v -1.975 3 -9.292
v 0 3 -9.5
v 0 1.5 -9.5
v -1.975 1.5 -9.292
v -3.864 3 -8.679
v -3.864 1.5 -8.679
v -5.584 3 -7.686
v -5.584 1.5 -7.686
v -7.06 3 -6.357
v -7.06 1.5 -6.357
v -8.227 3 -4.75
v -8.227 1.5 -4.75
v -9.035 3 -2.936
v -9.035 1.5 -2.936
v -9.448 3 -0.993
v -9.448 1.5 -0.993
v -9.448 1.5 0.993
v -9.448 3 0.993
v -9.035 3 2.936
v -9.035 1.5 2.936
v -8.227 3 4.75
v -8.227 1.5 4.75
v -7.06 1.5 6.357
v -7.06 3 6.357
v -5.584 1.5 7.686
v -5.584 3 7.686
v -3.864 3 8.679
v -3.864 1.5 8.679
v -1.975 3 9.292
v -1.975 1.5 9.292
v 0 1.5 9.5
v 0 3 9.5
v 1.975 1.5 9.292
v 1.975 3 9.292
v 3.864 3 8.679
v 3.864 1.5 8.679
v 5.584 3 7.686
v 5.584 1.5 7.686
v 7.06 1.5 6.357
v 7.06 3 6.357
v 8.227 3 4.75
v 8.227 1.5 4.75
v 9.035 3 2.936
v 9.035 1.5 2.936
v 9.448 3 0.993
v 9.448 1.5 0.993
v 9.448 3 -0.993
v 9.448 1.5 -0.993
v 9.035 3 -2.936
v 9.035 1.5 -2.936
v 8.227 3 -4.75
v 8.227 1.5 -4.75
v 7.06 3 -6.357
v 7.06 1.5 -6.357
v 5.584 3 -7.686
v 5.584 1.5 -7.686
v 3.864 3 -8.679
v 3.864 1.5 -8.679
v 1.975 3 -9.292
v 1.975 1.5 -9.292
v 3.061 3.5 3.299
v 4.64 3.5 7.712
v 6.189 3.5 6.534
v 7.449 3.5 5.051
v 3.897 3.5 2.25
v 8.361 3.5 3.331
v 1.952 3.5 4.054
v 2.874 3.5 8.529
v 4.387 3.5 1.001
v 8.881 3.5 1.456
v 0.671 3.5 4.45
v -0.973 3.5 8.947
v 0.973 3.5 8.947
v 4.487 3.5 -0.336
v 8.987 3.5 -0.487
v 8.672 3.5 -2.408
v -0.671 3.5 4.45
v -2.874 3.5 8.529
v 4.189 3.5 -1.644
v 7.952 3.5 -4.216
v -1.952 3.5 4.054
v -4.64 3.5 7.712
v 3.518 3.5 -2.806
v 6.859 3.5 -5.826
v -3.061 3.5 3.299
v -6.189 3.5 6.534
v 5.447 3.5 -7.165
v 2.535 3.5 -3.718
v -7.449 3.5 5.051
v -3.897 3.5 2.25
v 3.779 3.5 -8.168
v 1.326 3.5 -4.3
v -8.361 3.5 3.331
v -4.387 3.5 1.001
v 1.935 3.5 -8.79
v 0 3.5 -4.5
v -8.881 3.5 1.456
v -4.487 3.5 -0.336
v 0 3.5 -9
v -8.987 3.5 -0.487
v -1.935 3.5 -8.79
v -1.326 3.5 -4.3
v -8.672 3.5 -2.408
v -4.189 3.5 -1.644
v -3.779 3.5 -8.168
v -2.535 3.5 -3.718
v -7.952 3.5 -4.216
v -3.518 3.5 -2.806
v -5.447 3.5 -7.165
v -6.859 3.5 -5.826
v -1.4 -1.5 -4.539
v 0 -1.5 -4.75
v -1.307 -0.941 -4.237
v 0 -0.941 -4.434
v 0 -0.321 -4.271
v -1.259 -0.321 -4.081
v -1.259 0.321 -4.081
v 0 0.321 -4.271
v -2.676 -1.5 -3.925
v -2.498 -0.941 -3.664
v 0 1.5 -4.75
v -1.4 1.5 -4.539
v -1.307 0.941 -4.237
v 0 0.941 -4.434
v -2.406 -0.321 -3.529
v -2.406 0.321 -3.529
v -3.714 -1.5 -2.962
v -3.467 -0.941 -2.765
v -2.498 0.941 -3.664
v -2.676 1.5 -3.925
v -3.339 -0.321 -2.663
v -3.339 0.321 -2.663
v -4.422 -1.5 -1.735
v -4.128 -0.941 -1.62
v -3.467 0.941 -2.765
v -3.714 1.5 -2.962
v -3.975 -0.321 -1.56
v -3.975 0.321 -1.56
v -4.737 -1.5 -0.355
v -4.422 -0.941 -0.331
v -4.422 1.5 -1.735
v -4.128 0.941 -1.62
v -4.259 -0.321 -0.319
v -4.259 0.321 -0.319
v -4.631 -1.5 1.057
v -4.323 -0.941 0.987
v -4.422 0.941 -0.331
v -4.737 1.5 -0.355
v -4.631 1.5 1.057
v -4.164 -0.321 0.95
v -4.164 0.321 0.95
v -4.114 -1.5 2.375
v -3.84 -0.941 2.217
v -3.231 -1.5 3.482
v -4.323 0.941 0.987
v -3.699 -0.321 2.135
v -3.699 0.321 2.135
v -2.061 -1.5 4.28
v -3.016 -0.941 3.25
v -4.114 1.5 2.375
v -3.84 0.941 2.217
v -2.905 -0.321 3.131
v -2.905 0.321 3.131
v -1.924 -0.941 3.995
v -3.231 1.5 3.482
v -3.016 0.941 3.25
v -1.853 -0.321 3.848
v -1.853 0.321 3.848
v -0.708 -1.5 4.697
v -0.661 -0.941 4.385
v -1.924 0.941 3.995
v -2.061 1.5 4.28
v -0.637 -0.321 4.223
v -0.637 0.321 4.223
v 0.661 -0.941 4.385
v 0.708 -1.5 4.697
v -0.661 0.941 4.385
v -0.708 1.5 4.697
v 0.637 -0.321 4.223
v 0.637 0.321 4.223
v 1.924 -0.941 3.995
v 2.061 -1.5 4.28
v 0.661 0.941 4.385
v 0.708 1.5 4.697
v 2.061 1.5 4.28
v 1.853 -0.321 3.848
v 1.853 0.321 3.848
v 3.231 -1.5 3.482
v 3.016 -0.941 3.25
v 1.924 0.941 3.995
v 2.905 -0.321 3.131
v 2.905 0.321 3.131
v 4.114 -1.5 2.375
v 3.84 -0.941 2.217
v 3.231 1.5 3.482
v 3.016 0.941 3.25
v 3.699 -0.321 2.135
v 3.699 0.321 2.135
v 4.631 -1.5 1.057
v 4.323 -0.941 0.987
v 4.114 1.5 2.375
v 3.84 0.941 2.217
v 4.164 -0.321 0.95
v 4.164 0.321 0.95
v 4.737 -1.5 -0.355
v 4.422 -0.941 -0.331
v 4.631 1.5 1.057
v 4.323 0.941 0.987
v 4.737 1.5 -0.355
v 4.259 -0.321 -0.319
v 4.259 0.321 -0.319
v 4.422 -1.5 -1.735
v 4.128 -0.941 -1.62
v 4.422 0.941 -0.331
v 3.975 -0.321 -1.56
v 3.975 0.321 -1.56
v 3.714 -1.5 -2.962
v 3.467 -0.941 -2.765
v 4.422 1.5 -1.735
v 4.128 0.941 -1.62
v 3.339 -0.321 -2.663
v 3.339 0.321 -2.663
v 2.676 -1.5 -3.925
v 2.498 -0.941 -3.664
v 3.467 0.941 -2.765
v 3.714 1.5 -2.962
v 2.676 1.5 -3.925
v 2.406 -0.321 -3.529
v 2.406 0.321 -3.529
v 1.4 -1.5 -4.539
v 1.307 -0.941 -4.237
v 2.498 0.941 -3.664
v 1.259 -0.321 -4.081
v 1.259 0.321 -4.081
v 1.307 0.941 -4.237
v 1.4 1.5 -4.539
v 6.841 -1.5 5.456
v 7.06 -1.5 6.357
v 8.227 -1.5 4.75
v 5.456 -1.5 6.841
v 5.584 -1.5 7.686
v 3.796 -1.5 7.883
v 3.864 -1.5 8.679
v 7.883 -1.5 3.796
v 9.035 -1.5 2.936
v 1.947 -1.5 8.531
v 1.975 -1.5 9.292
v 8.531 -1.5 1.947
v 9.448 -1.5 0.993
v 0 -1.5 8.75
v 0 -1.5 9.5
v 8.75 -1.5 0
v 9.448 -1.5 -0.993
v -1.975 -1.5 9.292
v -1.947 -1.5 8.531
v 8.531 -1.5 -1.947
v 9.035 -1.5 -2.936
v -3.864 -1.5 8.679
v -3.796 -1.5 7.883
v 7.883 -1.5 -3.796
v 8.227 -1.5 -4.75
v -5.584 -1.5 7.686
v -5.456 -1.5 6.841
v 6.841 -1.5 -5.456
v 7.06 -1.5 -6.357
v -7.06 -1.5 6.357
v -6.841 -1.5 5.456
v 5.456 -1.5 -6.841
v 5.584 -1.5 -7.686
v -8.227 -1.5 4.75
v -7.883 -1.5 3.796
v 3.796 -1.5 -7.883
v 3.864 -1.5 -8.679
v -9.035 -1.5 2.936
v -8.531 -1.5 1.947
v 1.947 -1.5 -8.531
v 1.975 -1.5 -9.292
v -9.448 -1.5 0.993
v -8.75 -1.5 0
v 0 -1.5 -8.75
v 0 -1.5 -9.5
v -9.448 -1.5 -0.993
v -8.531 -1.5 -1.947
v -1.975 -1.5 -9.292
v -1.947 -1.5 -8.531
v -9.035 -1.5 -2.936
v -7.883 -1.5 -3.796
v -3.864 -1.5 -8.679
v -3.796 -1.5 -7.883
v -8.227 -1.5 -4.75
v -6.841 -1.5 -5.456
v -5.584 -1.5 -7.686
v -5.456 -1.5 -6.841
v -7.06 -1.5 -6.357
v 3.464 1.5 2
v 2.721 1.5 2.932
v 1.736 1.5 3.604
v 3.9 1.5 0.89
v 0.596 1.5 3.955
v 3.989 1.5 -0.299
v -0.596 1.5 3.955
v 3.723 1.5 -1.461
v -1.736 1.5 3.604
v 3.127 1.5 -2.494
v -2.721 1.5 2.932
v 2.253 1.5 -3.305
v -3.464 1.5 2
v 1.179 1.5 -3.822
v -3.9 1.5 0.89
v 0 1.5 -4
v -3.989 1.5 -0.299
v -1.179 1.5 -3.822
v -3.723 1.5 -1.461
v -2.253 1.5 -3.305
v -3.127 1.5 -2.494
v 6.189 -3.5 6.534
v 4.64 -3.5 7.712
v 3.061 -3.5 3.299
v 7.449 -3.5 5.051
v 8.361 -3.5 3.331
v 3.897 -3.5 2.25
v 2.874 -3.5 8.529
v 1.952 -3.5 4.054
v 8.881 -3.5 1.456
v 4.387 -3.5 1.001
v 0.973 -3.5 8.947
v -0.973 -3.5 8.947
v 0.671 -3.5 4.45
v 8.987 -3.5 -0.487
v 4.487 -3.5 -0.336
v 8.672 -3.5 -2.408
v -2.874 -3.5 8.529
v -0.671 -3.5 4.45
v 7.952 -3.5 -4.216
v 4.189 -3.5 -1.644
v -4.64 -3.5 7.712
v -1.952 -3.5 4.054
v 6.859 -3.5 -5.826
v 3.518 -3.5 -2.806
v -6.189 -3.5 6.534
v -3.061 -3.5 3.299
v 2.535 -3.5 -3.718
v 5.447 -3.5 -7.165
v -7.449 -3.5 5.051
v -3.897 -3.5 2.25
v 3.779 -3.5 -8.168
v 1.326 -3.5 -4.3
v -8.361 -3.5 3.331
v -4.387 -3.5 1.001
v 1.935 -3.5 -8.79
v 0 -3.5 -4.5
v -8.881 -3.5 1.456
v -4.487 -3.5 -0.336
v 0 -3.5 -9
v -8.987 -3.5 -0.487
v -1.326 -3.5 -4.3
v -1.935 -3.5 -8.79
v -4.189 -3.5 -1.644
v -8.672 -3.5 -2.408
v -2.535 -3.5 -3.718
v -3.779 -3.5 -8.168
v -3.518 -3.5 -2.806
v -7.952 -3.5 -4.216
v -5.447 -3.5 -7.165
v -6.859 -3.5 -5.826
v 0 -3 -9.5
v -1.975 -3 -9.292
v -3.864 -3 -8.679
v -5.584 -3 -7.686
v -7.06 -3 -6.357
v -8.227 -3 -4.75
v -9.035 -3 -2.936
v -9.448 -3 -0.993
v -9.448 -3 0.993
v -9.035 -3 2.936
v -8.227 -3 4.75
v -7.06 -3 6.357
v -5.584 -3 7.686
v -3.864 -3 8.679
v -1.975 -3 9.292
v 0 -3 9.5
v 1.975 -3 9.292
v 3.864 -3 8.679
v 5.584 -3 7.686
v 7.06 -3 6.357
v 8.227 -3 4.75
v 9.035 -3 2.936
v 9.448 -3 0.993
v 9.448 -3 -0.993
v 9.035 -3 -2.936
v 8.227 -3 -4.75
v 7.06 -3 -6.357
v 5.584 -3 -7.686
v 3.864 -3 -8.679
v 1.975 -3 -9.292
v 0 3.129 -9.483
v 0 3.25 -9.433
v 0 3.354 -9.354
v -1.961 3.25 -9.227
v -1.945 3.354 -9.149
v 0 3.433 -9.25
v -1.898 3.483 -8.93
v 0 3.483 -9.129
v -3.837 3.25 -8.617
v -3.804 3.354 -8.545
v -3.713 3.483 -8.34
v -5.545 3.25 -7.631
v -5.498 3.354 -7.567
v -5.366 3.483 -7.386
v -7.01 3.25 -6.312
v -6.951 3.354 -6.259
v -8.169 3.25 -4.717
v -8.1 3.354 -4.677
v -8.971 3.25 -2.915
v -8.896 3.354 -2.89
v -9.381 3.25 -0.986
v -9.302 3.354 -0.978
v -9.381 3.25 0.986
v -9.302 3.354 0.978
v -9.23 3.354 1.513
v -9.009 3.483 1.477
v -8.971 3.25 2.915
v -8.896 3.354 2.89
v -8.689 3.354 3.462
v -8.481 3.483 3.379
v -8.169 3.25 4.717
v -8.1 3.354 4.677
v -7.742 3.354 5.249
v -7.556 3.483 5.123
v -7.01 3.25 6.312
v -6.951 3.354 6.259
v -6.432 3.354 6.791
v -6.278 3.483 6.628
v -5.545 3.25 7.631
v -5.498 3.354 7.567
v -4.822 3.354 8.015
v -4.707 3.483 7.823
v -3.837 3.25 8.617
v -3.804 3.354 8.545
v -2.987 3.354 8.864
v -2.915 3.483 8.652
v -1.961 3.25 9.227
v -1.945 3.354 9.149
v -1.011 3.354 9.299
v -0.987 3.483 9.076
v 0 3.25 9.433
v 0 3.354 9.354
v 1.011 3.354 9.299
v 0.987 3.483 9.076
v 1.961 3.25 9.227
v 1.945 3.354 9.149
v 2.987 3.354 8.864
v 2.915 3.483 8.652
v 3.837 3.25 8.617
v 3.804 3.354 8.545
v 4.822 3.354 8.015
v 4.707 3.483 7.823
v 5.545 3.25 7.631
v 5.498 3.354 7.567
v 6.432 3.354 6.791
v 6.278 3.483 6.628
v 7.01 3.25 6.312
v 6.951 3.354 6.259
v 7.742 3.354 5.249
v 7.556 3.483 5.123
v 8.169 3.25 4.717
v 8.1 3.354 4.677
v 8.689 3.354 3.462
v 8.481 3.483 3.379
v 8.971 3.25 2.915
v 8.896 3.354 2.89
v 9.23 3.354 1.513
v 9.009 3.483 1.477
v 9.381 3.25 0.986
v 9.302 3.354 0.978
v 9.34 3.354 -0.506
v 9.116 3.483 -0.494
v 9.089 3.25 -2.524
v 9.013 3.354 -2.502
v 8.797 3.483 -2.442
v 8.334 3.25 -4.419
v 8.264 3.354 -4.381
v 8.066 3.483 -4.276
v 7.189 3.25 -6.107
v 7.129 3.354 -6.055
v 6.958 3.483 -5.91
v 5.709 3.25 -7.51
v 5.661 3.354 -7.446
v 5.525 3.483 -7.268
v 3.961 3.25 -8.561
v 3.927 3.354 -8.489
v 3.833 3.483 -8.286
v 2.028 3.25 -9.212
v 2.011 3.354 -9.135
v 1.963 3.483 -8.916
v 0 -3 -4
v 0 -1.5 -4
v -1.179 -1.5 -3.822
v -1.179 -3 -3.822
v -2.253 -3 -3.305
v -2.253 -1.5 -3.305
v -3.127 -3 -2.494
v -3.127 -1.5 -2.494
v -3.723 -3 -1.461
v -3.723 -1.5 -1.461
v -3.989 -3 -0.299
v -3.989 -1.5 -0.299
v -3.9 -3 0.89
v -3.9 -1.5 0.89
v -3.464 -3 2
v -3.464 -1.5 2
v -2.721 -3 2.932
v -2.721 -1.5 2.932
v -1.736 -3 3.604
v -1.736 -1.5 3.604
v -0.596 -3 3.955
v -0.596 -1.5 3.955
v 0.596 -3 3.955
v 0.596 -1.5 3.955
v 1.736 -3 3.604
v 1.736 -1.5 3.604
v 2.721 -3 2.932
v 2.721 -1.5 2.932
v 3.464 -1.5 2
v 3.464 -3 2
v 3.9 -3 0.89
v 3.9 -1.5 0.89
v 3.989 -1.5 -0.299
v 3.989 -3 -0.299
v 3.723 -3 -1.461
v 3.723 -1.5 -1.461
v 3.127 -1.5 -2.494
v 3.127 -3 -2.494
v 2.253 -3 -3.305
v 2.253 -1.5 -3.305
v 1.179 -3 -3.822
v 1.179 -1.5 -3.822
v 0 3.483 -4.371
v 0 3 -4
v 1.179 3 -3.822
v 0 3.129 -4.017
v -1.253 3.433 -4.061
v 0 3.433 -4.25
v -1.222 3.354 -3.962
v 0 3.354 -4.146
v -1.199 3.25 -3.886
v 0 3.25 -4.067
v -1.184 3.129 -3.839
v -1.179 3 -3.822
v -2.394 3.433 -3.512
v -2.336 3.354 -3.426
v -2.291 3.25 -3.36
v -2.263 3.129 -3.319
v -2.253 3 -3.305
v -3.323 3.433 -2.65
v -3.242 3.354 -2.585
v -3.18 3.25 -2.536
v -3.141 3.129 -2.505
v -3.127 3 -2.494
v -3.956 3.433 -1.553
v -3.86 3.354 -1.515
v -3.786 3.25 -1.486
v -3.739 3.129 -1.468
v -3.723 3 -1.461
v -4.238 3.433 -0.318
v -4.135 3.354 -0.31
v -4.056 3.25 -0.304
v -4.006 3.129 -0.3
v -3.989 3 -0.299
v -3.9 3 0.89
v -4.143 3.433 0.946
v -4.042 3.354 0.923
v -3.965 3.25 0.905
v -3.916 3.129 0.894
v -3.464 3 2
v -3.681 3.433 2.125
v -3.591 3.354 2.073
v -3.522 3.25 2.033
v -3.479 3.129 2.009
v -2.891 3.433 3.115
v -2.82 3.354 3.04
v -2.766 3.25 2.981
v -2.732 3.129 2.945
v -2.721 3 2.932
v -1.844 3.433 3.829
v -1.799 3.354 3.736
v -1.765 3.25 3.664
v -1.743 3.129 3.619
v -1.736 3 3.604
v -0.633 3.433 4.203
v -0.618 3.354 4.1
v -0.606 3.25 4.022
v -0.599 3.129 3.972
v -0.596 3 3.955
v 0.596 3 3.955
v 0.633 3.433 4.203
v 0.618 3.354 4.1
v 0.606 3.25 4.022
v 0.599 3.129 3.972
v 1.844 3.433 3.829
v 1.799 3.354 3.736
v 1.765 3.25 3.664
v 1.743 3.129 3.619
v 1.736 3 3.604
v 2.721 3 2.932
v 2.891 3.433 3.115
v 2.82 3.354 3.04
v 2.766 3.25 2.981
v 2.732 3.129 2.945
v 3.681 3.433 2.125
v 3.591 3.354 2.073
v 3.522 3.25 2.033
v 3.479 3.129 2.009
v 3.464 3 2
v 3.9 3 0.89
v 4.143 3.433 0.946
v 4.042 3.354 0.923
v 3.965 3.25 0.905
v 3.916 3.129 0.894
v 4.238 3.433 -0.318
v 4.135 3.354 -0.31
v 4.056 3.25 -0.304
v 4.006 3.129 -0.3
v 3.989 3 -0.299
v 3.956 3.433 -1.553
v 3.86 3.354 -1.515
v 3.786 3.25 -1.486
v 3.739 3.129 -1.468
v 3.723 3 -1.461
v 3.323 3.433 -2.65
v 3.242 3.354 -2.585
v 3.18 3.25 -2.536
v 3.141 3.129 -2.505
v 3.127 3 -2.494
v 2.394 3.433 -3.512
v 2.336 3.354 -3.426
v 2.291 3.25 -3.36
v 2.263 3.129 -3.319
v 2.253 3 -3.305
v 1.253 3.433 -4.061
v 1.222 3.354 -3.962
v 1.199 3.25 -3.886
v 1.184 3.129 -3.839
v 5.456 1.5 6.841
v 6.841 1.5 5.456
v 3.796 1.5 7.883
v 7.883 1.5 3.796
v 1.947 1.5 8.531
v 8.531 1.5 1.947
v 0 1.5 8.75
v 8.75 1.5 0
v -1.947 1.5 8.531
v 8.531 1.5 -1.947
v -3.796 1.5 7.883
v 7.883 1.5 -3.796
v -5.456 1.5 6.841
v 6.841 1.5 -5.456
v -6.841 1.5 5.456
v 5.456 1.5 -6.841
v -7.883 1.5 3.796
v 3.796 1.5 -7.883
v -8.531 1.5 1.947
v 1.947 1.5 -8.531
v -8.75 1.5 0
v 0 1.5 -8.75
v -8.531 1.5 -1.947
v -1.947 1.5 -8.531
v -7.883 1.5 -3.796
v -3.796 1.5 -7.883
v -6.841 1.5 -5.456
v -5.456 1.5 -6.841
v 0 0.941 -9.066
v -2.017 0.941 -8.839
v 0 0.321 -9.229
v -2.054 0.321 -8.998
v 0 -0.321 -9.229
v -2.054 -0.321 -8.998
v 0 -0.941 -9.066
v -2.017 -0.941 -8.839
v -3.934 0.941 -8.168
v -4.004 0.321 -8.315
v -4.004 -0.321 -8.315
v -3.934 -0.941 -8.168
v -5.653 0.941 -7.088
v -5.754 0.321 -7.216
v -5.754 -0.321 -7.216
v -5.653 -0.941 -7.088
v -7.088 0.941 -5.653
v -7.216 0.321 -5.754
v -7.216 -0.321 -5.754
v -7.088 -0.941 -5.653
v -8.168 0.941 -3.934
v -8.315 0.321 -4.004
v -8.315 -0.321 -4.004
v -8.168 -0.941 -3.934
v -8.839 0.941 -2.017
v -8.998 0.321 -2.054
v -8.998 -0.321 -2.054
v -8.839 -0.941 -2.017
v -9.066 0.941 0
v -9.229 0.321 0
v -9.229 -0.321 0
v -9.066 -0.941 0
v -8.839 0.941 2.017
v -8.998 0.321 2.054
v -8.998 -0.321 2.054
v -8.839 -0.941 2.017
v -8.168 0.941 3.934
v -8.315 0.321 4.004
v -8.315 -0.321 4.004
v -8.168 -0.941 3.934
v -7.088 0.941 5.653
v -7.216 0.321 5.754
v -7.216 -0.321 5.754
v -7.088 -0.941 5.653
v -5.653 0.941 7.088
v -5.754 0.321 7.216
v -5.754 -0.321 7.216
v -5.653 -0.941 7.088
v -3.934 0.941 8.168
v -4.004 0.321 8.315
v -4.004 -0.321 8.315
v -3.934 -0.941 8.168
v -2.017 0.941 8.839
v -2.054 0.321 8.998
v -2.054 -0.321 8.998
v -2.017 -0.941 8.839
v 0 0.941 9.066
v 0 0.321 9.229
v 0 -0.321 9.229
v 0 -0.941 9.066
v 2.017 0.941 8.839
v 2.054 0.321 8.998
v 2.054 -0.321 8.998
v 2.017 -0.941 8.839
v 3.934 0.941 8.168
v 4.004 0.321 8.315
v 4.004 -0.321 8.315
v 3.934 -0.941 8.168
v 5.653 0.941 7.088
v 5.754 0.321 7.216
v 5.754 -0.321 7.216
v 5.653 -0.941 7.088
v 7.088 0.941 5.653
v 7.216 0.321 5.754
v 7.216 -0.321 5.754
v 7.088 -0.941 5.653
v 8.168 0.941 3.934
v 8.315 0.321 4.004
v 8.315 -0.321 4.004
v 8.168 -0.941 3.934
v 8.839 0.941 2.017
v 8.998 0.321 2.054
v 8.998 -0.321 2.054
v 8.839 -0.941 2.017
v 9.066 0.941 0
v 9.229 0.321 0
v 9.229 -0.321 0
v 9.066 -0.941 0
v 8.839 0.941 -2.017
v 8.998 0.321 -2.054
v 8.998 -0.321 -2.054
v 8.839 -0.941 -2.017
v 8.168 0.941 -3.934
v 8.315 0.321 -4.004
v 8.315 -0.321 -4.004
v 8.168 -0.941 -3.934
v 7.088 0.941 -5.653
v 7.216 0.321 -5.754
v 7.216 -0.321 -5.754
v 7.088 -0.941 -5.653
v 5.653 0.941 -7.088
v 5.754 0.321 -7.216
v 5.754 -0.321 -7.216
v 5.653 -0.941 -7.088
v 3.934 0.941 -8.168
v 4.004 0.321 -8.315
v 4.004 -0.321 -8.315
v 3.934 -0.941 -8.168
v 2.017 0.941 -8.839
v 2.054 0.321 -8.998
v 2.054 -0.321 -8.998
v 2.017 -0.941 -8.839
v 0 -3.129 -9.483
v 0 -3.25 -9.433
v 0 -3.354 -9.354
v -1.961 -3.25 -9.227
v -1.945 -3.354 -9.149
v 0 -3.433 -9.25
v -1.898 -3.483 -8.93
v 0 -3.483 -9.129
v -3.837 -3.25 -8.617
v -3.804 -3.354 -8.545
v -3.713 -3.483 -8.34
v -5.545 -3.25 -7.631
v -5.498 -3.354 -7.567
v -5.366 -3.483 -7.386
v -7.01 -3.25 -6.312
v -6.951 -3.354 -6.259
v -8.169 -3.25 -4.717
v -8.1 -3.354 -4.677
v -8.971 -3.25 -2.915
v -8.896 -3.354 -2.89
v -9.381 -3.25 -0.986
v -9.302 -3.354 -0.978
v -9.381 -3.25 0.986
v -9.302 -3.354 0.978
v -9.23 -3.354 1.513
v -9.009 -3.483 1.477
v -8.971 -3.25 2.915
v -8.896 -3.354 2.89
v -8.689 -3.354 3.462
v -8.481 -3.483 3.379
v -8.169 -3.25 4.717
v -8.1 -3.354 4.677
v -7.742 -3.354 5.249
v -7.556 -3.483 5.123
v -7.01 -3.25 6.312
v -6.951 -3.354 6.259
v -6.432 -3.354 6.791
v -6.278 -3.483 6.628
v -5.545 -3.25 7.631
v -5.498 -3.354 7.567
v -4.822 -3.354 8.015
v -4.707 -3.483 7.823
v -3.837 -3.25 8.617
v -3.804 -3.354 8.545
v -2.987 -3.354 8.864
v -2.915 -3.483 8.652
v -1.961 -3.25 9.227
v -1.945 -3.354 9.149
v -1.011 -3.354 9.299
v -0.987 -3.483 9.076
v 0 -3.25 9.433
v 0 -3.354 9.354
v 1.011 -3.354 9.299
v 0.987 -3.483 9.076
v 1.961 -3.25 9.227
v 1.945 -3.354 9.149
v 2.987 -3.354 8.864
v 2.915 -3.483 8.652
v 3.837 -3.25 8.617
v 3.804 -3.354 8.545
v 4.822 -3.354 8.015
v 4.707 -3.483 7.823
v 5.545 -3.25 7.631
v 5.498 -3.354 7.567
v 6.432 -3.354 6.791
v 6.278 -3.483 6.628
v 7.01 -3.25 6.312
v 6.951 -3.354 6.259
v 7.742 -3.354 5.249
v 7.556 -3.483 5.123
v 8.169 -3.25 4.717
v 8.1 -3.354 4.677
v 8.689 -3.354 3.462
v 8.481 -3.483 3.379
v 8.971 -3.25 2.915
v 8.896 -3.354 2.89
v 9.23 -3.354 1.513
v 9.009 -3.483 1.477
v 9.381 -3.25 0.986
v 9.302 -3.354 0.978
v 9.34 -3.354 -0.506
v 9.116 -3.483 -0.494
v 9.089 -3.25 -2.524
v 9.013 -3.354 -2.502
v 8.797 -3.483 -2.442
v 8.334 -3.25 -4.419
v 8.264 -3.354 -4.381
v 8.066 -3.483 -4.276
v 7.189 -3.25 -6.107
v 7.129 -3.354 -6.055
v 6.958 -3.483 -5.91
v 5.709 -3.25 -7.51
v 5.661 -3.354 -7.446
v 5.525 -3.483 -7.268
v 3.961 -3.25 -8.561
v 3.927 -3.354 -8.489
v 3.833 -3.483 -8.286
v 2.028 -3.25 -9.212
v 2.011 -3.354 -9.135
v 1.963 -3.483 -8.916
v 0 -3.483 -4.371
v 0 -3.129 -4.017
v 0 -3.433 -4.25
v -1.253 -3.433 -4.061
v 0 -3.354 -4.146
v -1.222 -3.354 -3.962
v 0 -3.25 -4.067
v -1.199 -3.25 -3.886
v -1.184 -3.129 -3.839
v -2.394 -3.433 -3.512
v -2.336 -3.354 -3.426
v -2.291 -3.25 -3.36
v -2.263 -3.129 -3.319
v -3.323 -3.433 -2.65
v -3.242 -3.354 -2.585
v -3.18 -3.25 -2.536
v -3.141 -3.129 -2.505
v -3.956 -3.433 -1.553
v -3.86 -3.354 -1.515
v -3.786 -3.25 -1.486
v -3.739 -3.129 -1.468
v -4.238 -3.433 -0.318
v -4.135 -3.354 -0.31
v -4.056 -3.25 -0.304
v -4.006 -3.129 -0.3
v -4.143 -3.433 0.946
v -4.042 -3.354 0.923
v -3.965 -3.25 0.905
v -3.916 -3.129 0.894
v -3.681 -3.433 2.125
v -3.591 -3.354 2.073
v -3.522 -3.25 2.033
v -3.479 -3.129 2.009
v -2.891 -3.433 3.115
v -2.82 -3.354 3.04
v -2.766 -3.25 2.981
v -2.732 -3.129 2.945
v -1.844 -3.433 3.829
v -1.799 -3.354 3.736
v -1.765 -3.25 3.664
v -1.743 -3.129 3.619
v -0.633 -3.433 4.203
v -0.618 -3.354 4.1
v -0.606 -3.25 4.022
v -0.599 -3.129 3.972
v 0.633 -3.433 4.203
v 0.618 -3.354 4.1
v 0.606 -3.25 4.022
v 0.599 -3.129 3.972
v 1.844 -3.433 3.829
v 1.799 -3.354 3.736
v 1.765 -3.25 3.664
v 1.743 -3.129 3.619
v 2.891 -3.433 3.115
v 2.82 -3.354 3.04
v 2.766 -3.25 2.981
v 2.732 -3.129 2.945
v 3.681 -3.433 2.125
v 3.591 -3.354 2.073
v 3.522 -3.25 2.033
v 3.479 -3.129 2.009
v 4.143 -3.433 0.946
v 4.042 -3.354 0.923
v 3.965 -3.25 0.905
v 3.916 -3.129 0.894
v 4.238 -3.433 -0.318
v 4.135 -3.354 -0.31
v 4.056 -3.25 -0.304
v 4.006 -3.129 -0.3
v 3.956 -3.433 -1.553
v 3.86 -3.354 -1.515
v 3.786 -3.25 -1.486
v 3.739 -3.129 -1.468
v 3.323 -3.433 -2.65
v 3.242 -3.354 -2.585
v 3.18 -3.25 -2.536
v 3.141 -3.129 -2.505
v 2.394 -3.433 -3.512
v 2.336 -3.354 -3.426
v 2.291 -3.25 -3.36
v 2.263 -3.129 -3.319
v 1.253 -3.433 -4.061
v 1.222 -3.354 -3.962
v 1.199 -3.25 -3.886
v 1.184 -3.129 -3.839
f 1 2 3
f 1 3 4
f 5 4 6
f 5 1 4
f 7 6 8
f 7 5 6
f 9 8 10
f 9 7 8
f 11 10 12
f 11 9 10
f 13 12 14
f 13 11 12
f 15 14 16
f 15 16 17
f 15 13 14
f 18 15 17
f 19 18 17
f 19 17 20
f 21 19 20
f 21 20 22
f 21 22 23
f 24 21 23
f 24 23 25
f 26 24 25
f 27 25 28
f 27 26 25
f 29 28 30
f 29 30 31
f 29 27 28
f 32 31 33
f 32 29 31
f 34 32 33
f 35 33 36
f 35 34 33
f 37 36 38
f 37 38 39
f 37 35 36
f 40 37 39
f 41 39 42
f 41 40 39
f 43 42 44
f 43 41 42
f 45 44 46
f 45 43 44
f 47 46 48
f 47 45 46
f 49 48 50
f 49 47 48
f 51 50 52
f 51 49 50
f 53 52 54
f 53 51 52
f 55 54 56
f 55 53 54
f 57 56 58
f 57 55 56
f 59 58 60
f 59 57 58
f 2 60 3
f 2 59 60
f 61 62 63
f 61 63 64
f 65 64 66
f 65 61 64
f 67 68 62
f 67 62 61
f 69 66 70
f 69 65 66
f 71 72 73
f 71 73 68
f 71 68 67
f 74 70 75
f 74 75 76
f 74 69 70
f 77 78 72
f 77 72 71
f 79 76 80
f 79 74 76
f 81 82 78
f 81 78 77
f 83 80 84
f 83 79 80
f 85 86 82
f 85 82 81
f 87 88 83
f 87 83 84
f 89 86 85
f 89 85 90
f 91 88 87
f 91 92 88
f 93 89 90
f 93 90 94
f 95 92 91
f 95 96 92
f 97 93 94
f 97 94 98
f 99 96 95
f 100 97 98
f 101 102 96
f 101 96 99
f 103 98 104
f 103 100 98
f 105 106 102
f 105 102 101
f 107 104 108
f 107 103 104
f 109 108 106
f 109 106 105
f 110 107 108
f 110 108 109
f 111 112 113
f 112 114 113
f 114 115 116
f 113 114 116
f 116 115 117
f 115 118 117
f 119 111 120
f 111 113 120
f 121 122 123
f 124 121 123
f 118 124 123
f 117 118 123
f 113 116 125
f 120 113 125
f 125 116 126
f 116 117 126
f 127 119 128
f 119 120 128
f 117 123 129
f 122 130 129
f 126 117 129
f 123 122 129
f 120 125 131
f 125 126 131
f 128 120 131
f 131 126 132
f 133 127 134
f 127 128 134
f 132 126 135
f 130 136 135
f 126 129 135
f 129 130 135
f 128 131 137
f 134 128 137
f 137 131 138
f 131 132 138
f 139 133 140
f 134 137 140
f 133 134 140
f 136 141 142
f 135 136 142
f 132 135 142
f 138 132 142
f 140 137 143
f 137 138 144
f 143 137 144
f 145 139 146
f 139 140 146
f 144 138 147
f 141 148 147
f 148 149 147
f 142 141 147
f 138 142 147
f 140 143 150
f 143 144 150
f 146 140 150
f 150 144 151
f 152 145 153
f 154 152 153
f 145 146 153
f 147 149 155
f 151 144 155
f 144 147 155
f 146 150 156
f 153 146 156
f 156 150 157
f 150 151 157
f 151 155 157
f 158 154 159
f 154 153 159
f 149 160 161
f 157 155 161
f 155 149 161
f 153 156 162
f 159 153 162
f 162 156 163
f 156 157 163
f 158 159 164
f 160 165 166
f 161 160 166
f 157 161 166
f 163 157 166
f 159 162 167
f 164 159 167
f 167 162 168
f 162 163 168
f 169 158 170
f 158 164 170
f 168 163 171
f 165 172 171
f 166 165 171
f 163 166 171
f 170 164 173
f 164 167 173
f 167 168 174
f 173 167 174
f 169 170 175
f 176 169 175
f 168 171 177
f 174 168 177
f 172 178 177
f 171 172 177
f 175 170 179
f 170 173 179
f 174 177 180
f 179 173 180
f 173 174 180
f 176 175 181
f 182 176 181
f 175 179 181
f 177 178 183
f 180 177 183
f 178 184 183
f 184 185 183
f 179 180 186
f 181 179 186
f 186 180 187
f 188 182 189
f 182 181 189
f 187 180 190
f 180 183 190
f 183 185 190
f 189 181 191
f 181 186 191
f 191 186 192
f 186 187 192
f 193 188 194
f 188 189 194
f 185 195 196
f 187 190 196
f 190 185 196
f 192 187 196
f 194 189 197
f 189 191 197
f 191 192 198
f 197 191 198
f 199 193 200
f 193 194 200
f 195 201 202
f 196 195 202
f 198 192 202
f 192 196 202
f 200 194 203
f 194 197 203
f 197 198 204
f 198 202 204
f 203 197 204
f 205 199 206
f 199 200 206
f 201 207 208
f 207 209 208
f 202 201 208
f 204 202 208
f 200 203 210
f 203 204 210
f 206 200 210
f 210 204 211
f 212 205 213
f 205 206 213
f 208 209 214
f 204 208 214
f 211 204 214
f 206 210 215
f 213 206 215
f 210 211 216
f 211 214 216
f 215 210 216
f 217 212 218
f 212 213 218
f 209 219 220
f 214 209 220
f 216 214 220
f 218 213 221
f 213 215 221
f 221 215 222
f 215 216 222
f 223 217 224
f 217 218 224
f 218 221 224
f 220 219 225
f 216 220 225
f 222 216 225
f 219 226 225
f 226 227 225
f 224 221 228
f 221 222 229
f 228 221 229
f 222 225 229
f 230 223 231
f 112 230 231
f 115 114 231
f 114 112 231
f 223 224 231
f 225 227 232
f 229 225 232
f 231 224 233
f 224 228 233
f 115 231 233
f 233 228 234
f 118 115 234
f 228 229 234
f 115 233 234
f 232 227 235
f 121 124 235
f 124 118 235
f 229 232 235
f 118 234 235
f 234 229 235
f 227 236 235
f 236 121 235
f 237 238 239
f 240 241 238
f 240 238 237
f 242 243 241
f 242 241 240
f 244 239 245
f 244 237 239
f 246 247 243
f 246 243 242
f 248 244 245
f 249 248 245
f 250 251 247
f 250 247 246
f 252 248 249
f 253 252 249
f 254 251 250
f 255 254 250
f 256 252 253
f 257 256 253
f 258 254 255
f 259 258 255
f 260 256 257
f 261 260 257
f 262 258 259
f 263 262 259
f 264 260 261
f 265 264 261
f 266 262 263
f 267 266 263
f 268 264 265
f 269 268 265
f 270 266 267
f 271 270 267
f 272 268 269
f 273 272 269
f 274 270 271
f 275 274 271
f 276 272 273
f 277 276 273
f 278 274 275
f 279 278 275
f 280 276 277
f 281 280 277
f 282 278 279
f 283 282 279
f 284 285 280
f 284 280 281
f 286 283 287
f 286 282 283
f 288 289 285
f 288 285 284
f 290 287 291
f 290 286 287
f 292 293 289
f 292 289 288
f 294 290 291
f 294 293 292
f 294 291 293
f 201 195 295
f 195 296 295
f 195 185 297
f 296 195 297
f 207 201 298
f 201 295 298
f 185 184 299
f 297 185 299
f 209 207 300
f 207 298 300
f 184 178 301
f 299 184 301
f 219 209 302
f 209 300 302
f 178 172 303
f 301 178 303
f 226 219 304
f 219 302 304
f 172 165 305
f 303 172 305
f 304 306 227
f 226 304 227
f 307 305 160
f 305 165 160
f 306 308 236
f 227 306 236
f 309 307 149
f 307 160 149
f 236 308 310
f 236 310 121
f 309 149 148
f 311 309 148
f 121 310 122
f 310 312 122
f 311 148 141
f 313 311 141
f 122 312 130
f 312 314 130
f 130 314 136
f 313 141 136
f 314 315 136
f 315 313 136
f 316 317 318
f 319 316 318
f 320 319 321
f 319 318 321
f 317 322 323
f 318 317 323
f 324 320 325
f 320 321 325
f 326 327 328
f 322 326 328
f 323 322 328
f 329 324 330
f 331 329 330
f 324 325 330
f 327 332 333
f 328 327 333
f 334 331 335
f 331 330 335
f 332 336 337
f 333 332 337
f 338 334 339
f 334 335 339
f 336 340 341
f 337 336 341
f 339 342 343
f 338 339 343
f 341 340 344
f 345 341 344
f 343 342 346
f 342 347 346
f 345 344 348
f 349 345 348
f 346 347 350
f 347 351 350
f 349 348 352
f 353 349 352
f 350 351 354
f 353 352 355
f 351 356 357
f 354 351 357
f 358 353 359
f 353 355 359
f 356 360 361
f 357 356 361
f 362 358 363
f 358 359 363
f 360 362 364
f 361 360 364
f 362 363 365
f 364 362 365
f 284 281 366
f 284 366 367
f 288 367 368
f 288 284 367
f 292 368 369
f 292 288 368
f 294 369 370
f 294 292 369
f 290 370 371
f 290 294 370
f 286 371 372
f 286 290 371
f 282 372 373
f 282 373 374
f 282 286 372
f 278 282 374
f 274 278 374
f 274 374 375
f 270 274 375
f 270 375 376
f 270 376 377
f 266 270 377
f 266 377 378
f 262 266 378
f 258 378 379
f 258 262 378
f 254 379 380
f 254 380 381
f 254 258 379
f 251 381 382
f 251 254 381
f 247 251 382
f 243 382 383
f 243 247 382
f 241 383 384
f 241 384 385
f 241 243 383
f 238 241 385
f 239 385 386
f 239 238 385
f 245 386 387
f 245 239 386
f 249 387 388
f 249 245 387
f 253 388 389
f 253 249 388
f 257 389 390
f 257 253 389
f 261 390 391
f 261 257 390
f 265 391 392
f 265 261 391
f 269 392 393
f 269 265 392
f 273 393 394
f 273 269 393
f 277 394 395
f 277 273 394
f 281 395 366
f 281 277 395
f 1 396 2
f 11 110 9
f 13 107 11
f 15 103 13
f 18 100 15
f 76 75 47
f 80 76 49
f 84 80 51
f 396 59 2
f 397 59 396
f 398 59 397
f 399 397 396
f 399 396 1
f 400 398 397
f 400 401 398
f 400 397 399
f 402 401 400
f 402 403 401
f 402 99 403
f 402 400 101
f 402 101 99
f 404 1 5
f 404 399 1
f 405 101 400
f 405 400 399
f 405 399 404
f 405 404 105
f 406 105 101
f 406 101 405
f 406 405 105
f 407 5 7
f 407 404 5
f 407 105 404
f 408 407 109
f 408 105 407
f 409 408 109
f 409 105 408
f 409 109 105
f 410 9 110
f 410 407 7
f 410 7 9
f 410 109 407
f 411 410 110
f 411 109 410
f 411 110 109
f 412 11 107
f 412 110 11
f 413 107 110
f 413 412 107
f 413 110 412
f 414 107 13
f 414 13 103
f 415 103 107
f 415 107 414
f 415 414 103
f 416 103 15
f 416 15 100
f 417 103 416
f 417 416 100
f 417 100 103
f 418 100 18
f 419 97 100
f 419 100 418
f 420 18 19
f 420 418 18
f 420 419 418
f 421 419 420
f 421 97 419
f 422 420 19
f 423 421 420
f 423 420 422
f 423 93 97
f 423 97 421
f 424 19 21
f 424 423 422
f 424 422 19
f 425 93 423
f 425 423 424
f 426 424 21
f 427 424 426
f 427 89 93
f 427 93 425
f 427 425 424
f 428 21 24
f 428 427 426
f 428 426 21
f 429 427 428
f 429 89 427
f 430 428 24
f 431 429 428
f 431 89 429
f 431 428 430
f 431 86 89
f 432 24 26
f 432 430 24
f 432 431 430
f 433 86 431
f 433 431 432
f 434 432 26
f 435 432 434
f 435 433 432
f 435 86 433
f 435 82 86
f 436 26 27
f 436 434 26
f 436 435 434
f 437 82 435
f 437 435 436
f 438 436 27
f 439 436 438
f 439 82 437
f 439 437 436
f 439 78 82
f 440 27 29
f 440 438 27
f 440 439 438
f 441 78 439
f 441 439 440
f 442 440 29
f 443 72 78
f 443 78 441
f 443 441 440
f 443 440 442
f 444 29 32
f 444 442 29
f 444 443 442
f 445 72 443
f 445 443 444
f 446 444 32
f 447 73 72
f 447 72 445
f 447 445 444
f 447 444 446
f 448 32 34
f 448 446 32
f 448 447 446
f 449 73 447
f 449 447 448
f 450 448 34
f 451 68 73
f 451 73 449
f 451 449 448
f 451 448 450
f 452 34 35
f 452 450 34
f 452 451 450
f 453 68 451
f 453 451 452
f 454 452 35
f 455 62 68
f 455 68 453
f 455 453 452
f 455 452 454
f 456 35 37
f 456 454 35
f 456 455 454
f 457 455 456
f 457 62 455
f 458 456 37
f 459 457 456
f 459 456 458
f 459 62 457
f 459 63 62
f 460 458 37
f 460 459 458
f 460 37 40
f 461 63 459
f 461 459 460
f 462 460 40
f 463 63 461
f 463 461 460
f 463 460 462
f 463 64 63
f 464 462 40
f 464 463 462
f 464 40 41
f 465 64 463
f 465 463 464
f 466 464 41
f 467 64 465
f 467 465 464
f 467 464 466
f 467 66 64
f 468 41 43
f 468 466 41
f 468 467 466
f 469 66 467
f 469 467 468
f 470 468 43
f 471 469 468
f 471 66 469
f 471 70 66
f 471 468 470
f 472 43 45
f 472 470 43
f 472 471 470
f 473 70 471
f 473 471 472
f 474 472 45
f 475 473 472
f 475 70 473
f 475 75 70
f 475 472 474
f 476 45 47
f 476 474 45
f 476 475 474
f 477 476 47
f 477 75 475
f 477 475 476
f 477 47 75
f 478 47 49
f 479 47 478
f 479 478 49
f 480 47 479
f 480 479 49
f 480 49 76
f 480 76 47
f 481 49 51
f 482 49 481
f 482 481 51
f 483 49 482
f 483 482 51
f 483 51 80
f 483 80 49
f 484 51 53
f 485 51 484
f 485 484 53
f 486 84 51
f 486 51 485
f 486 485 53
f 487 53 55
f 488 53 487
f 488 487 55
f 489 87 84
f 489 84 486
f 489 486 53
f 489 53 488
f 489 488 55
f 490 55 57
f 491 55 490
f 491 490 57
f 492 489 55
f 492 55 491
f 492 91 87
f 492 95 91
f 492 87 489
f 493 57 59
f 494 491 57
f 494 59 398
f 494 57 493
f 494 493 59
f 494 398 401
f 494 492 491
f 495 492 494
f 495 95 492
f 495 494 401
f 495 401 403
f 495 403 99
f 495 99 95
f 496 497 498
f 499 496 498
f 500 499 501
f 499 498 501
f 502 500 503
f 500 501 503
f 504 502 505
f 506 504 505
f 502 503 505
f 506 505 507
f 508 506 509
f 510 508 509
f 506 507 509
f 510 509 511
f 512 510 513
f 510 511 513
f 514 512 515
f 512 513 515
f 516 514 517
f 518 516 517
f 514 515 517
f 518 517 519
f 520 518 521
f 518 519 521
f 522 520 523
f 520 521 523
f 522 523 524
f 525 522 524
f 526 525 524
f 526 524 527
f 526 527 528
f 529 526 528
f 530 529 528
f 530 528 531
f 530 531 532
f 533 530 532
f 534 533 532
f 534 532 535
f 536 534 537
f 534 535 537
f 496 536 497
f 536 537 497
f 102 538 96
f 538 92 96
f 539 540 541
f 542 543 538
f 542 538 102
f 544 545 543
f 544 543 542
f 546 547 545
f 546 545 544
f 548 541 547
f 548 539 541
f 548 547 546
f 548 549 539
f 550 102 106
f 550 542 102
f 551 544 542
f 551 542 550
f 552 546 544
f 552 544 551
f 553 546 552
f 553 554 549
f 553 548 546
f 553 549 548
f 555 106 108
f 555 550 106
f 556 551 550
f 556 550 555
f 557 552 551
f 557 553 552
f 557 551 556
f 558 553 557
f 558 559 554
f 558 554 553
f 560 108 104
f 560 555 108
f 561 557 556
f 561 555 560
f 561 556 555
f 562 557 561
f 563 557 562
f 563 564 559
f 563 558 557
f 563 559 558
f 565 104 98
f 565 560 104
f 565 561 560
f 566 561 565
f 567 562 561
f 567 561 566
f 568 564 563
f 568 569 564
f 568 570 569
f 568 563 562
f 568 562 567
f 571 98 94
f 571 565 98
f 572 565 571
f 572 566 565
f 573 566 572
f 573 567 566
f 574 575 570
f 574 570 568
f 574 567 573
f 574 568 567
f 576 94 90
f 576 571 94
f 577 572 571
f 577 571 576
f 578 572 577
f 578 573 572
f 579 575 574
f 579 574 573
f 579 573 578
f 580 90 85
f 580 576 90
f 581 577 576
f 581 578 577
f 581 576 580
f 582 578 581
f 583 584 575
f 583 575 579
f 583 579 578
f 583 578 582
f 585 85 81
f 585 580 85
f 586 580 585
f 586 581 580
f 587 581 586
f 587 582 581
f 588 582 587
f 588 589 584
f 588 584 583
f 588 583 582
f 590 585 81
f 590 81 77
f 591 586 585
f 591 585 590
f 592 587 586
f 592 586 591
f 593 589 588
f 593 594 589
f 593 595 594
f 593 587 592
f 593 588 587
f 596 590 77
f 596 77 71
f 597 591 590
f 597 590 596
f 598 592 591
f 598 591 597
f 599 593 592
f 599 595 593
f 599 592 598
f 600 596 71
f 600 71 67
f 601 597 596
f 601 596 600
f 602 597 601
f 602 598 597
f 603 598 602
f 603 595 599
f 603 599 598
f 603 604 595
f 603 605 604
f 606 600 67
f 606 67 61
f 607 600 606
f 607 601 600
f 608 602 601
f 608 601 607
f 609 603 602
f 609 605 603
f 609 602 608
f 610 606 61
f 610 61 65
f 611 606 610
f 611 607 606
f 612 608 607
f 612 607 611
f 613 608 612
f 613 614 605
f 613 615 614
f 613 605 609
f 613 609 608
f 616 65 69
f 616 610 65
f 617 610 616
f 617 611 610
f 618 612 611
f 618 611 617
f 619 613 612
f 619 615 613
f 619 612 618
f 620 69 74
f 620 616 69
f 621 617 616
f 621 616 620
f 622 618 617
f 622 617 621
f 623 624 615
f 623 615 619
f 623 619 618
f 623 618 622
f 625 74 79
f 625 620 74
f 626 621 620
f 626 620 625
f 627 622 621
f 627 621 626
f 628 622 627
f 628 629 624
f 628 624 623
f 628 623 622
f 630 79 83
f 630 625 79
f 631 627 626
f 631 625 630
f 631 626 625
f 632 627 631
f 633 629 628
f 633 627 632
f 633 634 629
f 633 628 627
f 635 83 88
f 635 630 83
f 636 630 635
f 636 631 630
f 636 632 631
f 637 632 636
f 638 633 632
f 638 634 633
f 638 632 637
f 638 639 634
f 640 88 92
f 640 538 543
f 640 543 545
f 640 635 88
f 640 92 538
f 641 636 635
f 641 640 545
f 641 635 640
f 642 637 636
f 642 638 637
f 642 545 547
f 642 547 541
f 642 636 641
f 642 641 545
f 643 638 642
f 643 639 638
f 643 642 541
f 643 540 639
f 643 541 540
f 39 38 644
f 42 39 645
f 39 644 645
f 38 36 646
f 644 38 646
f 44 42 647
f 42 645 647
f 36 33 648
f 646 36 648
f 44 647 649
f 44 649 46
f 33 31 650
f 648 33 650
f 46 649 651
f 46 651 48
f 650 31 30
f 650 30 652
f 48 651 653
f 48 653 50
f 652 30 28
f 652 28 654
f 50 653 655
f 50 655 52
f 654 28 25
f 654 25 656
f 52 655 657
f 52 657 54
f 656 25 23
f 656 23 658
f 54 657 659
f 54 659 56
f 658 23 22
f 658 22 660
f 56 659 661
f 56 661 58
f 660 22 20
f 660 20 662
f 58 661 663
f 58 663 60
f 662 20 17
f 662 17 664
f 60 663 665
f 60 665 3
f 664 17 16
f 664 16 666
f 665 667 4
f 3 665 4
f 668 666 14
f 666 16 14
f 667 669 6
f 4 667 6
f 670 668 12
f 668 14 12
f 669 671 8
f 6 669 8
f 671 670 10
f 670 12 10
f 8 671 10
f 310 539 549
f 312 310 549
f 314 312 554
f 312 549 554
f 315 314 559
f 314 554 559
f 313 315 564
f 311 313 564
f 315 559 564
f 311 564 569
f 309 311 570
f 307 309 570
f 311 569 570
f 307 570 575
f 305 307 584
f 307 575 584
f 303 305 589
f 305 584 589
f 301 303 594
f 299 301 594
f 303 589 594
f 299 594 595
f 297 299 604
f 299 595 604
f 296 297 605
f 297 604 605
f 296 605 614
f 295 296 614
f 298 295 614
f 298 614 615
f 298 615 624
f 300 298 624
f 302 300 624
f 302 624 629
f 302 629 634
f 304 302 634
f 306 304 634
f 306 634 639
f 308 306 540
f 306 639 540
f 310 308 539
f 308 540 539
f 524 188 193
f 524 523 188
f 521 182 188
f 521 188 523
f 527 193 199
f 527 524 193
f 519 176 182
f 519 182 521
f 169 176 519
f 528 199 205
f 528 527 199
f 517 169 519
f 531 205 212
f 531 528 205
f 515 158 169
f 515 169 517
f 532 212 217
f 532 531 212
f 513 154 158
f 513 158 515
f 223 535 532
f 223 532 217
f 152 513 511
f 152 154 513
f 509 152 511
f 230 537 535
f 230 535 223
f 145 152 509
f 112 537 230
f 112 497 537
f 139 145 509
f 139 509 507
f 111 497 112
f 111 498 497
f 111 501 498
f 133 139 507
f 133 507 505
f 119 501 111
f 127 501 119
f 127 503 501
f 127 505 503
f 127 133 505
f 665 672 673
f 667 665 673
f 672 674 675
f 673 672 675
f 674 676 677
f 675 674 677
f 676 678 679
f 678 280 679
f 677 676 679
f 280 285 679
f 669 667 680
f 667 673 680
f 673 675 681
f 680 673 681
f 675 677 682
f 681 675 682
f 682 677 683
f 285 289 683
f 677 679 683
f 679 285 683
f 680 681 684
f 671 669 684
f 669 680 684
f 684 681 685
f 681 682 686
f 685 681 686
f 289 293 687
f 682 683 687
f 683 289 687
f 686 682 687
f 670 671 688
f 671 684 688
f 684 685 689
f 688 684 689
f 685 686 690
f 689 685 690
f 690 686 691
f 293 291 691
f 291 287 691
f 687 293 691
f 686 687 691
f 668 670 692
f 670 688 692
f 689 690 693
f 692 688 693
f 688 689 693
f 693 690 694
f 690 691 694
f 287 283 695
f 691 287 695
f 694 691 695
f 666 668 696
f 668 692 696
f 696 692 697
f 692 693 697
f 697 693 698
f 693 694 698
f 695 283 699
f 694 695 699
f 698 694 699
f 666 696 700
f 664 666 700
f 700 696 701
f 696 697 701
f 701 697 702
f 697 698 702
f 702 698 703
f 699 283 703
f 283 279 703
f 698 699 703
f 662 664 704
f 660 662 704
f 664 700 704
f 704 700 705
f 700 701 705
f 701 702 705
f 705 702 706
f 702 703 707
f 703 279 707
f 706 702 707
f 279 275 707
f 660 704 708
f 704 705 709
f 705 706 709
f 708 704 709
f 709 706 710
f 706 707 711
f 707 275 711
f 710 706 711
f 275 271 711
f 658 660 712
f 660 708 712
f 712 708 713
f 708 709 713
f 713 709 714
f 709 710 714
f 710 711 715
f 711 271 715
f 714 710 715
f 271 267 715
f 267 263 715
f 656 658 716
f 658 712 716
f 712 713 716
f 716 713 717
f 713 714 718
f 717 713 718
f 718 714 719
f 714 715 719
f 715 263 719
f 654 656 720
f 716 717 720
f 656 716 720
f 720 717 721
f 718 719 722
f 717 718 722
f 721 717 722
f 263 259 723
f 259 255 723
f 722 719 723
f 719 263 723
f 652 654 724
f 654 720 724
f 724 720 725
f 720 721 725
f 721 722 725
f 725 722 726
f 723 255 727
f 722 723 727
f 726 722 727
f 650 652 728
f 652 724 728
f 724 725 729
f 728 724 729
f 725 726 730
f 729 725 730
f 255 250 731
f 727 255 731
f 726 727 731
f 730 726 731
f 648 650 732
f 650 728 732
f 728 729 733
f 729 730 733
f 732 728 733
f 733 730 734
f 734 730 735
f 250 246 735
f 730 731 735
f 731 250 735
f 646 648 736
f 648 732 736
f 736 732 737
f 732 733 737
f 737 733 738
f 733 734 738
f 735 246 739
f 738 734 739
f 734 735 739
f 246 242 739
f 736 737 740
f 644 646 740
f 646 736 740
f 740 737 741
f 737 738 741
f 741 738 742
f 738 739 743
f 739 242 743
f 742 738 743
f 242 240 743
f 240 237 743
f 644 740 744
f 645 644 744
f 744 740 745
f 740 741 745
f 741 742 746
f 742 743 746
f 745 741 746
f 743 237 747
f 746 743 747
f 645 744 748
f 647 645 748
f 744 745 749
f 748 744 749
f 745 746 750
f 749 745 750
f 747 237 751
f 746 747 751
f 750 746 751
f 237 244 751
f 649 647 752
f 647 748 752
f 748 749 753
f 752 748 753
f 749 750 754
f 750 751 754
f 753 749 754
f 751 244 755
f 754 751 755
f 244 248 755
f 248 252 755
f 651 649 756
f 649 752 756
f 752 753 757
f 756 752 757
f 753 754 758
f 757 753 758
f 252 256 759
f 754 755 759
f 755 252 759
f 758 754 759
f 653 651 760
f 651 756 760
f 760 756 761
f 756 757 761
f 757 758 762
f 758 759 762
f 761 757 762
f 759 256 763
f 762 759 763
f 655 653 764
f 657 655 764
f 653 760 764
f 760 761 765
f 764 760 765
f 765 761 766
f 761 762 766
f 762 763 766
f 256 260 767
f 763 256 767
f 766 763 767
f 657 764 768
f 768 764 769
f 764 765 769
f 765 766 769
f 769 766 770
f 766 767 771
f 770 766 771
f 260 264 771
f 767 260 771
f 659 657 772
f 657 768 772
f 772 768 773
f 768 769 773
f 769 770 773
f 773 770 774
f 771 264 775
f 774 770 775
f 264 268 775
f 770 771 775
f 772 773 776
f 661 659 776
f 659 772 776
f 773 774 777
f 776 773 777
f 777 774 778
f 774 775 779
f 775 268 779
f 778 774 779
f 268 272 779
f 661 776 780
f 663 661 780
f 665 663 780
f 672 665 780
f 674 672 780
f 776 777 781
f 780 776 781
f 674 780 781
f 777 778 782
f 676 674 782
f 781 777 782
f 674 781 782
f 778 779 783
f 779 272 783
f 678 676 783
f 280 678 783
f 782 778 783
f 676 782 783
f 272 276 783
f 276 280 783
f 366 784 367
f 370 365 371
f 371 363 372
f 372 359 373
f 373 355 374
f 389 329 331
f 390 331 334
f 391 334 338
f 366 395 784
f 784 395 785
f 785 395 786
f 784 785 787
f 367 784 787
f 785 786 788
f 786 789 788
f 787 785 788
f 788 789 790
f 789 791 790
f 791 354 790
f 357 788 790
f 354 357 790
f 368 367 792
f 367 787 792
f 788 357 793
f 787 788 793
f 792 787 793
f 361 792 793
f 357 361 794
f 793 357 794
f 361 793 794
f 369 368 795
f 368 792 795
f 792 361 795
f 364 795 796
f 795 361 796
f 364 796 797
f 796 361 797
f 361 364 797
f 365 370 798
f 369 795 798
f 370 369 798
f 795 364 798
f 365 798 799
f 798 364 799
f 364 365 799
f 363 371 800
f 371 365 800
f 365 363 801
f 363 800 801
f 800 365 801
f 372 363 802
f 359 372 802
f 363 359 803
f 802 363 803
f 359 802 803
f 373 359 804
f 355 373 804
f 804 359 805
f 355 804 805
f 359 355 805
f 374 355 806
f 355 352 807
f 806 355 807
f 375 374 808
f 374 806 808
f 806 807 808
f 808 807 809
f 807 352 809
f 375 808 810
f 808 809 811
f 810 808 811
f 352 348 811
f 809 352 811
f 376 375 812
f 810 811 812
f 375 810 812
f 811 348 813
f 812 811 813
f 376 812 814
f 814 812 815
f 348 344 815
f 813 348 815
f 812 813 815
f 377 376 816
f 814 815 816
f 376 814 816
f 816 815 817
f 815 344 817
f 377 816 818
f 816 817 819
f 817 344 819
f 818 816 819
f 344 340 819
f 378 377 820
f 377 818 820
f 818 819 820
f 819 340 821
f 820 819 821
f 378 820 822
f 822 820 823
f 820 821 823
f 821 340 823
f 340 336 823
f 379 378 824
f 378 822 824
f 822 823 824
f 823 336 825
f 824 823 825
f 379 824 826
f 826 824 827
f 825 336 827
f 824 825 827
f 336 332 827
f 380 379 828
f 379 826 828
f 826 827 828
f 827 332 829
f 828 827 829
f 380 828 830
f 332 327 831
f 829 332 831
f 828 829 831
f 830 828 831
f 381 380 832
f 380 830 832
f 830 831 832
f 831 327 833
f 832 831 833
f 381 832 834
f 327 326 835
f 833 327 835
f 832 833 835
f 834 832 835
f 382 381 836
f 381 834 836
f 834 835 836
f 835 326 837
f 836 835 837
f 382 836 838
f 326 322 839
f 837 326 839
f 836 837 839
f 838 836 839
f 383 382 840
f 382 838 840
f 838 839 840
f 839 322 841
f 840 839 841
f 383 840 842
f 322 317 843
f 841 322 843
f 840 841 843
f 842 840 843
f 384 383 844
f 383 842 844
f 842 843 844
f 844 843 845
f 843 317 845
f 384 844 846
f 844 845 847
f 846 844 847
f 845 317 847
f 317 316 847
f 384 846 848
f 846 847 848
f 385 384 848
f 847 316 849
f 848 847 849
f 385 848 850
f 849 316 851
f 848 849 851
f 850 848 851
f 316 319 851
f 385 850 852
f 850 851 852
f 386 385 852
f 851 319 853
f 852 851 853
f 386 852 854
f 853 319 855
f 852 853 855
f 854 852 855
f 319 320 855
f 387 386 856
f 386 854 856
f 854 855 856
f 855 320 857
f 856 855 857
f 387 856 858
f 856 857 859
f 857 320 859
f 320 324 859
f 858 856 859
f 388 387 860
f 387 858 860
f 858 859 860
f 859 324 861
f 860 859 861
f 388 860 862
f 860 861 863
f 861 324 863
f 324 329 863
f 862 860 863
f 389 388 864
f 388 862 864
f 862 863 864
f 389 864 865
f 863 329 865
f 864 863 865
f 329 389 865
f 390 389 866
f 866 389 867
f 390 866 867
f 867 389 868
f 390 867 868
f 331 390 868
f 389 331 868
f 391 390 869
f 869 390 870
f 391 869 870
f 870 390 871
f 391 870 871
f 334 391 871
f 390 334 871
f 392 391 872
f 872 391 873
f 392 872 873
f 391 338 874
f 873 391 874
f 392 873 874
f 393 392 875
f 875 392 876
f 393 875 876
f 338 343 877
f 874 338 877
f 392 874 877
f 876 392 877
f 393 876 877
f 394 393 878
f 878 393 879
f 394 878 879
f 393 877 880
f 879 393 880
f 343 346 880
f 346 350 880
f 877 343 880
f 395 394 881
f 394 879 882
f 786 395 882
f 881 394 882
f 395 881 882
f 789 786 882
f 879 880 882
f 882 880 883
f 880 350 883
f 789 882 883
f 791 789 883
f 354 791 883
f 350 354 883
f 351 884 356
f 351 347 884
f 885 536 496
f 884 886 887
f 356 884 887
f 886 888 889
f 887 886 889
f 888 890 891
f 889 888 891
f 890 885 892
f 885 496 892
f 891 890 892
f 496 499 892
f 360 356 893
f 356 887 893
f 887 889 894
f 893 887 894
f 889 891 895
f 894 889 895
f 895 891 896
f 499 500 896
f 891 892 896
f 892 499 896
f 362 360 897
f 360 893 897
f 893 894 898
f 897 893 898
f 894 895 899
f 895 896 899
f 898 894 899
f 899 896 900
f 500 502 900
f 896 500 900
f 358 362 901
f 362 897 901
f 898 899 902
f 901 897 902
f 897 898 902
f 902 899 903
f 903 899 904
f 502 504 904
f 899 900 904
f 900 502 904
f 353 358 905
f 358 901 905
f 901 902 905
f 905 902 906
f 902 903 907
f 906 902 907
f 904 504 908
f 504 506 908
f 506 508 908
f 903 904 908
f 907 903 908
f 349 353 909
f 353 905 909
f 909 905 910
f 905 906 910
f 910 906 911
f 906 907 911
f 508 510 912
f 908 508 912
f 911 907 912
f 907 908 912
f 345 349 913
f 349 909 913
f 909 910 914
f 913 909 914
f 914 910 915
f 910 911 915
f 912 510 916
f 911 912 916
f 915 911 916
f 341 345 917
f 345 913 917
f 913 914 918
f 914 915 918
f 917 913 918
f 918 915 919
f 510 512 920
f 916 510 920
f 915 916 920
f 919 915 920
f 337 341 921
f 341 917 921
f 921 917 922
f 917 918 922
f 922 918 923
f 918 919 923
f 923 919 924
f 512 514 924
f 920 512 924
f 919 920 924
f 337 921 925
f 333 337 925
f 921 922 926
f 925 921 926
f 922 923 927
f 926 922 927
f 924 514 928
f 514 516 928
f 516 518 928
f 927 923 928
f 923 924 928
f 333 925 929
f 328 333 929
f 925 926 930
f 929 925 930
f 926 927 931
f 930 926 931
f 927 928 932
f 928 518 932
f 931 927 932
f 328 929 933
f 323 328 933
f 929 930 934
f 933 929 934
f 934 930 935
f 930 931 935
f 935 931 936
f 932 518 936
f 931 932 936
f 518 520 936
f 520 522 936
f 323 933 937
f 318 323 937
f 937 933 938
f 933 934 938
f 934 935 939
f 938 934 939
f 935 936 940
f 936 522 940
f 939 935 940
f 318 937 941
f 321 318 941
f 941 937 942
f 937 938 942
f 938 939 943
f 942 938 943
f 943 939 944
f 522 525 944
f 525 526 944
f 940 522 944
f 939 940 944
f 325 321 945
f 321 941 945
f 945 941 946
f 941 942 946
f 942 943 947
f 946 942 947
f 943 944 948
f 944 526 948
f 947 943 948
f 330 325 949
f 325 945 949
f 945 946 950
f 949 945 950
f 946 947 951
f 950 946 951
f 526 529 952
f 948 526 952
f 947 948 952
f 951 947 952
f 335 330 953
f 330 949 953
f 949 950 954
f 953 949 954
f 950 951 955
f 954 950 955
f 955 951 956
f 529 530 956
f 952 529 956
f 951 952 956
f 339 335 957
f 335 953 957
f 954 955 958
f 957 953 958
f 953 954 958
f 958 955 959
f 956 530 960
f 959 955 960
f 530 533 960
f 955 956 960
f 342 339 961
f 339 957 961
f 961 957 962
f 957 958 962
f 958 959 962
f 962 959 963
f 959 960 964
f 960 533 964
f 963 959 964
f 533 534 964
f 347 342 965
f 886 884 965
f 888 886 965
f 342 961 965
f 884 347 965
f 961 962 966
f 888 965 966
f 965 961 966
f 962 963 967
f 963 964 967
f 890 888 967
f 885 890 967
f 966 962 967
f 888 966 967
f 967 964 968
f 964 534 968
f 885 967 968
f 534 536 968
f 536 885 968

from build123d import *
from build123d.topology import SkipClean

# Parameters (mm, degrees)
ESBO_O1_R = 2.5
ESBO_O1_W = 5.5
ESBO_O1_H = 2
FILETE1_R = 0.5


with BuildPart() as part:
    # Esboço1 → Revolução1 (revolve)
    with SkipClean():  # the faces are left unmerged after this step: merging them gives an invalid solid
        with BuildSketch(Plane.XY, mode=Mode.PRIVATE) as revolu_o1_sk:
            with Locations((-6.75, 0)):
                Circle(ESBO_O1_R)
            with Locations((-6.75, 2.5)):
                Rectangle(ESBO_O1_W, ESBO_O1_H)
            with BuildLine():
                ThreePointArc((-4.75, 1.5), (-6.75, 2.5), (-8.75, 1.5))
                Line((-8.75, 1.5), (-4.75, 1.5))
            make_face()
            with BuildLine():
                Line((-4.75, 1.5), (-8.75, 1.5))
                ThreePointArc((-8.75, 1.5), (-9.25, 0), (-8.75, -1.5))
                Line((-8.75, -1.5), (-4.75, -1.5))
                ThreePointArc((-4.75, -1.5), (-4.378291755, -0.790569415), (-4.25, 0))
                ThreePointArc((-4.25, 0), (-4.378291755, 0.790569415), (-4.75, 1.5))
            make_face()
            with BuildLine():
                Line((-4.75, -1.5), (-8.75, -1.5))
                ThreePointArc((-8.75, -1.5), (-6.75, -2.5), (-4.75, -1.5))
            make_face()
            with Locations((-6.75, -2.5)):
                Rectangle(ESBO_O1_W, ESBO_O1_H)
        revolve(revolu_o1_sk.sketch.rotate(Axis((0, 0, 0), (0, 1, 0)), 270), axis=Axis((0, 0, 0), (0, 1, 0)))

    # Filete1
    filete1_edges = [part.edges().sort_by_distance(p)[0] for p in [
        (0, 3.5, 4),
        (0, -3.5, 4),
        (0, -3.5, 9.5),
        (0, 3.5, 9.5),
    ]]
    fillet(filete1_edges, radius=FILETE1_R)


solid = part.part
